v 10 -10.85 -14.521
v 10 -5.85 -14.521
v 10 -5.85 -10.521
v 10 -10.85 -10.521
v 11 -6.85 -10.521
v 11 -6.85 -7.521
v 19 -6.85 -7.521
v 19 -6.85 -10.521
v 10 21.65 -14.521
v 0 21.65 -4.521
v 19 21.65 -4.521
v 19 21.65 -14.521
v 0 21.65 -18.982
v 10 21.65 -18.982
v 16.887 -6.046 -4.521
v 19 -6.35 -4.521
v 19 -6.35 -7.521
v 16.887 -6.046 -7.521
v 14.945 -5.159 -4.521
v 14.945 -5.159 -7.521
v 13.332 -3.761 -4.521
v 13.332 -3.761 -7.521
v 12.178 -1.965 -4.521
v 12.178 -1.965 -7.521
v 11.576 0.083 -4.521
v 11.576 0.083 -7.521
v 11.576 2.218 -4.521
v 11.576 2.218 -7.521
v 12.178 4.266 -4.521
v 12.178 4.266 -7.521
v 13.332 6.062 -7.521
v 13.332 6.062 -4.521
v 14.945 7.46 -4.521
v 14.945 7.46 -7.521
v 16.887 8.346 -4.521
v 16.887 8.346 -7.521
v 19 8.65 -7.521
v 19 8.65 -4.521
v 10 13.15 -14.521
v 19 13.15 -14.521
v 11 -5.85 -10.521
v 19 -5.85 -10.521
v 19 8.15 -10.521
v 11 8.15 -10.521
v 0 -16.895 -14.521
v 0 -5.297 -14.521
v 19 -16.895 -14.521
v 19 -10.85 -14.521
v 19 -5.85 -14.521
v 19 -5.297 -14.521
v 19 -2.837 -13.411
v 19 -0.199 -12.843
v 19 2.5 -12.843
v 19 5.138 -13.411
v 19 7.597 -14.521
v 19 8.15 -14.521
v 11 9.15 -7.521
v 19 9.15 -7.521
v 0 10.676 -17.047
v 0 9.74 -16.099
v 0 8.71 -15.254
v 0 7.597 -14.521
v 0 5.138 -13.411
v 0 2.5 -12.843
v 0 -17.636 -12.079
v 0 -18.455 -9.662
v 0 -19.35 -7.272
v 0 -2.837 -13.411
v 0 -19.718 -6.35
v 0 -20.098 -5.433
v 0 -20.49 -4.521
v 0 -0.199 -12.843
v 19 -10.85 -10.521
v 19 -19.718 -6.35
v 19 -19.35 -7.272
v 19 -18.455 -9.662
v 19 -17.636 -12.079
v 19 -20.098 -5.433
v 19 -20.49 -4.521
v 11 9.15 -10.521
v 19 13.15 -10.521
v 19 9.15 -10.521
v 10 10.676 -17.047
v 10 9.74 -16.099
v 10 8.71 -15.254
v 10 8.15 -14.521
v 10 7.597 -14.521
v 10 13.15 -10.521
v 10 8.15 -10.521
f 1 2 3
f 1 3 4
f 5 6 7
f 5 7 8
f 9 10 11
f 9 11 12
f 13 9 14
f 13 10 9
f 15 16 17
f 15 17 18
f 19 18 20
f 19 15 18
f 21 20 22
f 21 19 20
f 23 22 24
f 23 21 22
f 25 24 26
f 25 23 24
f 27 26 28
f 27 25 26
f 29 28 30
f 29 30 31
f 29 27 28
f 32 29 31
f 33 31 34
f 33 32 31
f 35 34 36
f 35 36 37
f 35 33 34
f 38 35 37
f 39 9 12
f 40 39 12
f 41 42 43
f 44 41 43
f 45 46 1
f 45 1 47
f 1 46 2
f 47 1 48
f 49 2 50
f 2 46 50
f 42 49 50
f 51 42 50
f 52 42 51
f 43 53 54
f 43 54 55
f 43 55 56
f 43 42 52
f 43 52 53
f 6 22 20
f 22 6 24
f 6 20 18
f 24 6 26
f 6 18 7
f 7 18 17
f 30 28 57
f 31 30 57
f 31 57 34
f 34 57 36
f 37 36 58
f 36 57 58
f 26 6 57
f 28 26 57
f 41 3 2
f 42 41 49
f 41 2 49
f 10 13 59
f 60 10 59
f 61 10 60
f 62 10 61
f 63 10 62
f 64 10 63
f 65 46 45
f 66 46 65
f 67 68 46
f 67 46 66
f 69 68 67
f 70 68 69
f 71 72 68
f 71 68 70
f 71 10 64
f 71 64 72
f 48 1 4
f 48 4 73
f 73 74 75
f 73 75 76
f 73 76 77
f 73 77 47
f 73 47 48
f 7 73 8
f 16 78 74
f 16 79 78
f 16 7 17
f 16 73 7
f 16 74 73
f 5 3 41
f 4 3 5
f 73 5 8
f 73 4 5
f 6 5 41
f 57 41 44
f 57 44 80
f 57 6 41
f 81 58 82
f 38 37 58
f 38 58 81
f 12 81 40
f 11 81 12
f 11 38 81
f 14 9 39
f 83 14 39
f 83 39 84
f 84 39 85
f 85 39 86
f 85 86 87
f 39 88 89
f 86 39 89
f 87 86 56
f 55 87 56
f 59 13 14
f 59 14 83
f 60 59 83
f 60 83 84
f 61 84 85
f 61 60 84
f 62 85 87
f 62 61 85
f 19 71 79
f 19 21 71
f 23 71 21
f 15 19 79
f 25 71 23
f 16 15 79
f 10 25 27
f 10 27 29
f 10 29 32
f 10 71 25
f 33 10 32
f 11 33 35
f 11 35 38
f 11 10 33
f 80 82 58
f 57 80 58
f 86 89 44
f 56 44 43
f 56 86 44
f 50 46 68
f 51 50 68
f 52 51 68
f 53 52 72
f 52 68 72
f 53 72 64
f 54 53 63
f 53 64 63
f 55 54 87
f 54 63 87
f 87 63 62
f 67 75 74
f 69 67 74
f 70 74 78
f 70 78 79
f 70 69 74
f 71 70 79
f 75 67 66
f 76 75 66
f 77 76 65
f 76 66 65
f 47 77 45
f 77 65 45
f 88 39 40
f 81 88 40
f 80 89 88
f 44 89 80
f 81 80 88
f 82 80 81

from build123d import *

# Parameters (mm, degrees)
F0_W      = 22
F0_H      = 10
F1_DEPTH  = 19
F2_W      = 19
F2_H      = 19
F3_DEPTH  = 10
F4_W      = 9
F4_H      = 5
F5_DEPTH  = 4
F7_DEPTH  = 25
F9_DEPTH  = 19
F10_DEPTH = 25
F12_DEPTH = 10
F14_DEPTH = 8
F16_DEPTH = 3


# Not quite as in the source:
# - a feature names something its author has since deleted; it is built from what else it names


with BuildPart() as f1:
    # F0 (on Right) → F1 (new body)
    with BuildSketch(Plane.YZ):
        with Locations((10.6502909437, -9.5214466426)):
            Rectangle(F0_W, F0_H)
    extrude(amount=F1_DEPTH)

    # F2 (on face) → F3 (join)
    with BuildSketch(Plane.XY.offset(-4.5214466426)):
        with Locations((9.5, -9.8497090563)):
            Rectangle(F2_W, F2_H)
    extrude(amount=-F3_DEPTH)

    # F4 (on face) → F5 (cut)
    with BuildSketch(Plane(origin=(0, 0, -14.5214466426), x_dir=(1, 0, 0), z_dir=(0, 0, -1))):
        with Locations((14.5, 8.3497090563)):
            Rectangle(F4_W, F4_H)
        with Locations((14.5, -10.6502909437)):
            Rectangle(F4_W, F4_H)
    extrude(amount=-F5_DEPTH, mode=Mode.SUBTRACT)

    # F6 (on face) → F7 (cut)
    with BuildSketch(Plane(origin=(0, 0, 0), x_dir=(0, -1, 0), z_dir=(-1, 0, 0))):
        with BuildLine():
            Line((-7.5971894228, -14.5214466426), (5.2966075354, -14.5214466426))
            ThreePointArc((5.2966075354, -14.5214466426), (-1.1502909437, -12.7714466426), (-7.5971894228, -14.5214466426))
        make_face()
        with BuildLine():
            ThreePointArc((-7.5971894228, -14.5214466426), (-7.4892397679, -36.5840063737), (11.5997090563, -25.5214466426))
            ThreePointArc((11.5997090563, -25.5214466426), (9.9122687874, -19.1824978184), (5.2966075354, -14.5214466426))
            Line((5.2966075354, -14.5214466426), (-7.5971894228, -14.5214466426))
        make_face()
    extrude(amount=-F7_DEPTH, mode=Mode.SUBTRACT)

    # F8 (on face) → F9 (join)
    with BuildSketch(Plane(origin=(0, 0, 0), x_dir=(0, -1, 0), z_dir=(-1, 0, 0))):
        with BuildLine():
            ThreePointArc((19.3497090563, -7.2717528529), (78.9260517523, -115.1245254627), (173.8108090563, -36.5214466426))
            ThreePointArc((173.8108090563, -36.5214466426), (110.1555805515, 41.7910583919), (20.489597937, -4.5214466426))
            Line((20.489597937, -4.5214466426), (33.1326909363, -4.5214466426))
            Line((33.1326909363, -4.5214466426), (33.1326909363, -14.5214466426))
            Line((33.1326909363, -14.5214466426), (19.3497090563, -14.5214466426))
            Line((19.3497090563, -14.5214466426), (19.3497090563, -7.2717528529))
        make_face()
        with BuildLine():
            ThreePointArc((19.3497090563, -7.2717528529), (19.9068584447, -5.8912967246), (20.489597937, -4.5214466426))
            Line((20.489597937, -4.5214466426), (19.3497090563, -4.5214466426))
            Line((19.3497090563, -4.5214466426), (19.3497090563, -7.2717528529))
        make_face()
    extrude(amount=-F9_DEPTH)

    # F8 (on face) → F10 (cut)
    with BuildSketch(Plane(origin=(0, 0, 0), x_dir=(0, -1, 0), z_dir=(-1, 0, 0))):
        with BuildLine():
            ThreePointArc((19.3497090563, -7.2717528529), (78.9260517523, -115.1245254627), (173.8108090563, -36.5214466426))
            ThreePointArc((173.8108090563, -36.5214466426), (110.1555805515, 41.7910583919), (20.489597937, -4.5214466426))
            Line((20.489597937, -4.5214466426), (33.1326909363, -4.5214466426))
            Line((33.1326909363, -4.5214466426), (33.1326909363, -14.5214466426))
            Line((33.1326909363, -14.5214466426), (19.3497090563, -14.5214466426))
            Line((19.3497090563, -14.5214466426), (19.3497090563, -7.2717528529))
        make_face()
    extrude(amount=-F10_DEPTH, mode=Mode.SUBTRACT)

    # F11 (on face) → F12 (join)
    with BuildSketch(Plane(origin=(0, 0, 0), x_dir=(0, -1, 0), z_dir=(-1, 0, 0))):
        with BuildLine():
            ThreePointArc((-10.6762534344, -17.046864728), (-9.2359267268, -15.6632016678), (-7.5971894228, -14.5214466426))
            Line((-7.5971894228, -14.5214466426), (-21.6502909437, -14.5214466426))
            Line((-21.6502909437, -14.5214466426), (-21.6502909437, -18.9818836282))
            Line((-21.6502909437, -18.9818836282), (-10.6762534344, -17.046864728))
        make_face()
    extrude(amount=-F12_DEPTH)

    # F13 (on face) → F14 (cut)
    with BuildSketch(Plane.YZ.offset(19)):
        Polygon((1.1502909437, -4.5214466426), (-6.8497090563, -4.5214466426), (-6.8497090563, -10.5214466426), (-5.8497090563, -10.5214466426), (1.1502909437, -10.5214466426), align=None)
        Polygon((9.1502909437, -4.5214466426), (1.1502909437, -4.5214466426), (1.1502909437, -10.5214466426), (8.1502909437, -10.5214466426), (9.1502909437, -10.5214466426), align=None)
    extrude(amount=-F14_DEPTH, mode=Mode.SUBTRACT)

    # F15 (on face) → F16 (join)
    with BuildSketch(Plane.XY.offset(-4.5214466426)):
        with BuildLine():
            ThreePointArc((19, -6.3497090563), (11.5, 1.1502909437), (19, 8.6502909437))
            Line((19, 8.6502909437), (19, 9.1502909437))
            Line((19, 9.1502909437), (11, 9.1502909437))
            Line((11, 9.1502909437), (11, -6.8497090563))
            Line((11, -6.8497090563), (19, -6.8497090563))
            Line((19, -6.8497090563), (19, -6.3497090563))
        make_face()
    extrude(amount=-F16_DEPTH)


solid = f1.part
